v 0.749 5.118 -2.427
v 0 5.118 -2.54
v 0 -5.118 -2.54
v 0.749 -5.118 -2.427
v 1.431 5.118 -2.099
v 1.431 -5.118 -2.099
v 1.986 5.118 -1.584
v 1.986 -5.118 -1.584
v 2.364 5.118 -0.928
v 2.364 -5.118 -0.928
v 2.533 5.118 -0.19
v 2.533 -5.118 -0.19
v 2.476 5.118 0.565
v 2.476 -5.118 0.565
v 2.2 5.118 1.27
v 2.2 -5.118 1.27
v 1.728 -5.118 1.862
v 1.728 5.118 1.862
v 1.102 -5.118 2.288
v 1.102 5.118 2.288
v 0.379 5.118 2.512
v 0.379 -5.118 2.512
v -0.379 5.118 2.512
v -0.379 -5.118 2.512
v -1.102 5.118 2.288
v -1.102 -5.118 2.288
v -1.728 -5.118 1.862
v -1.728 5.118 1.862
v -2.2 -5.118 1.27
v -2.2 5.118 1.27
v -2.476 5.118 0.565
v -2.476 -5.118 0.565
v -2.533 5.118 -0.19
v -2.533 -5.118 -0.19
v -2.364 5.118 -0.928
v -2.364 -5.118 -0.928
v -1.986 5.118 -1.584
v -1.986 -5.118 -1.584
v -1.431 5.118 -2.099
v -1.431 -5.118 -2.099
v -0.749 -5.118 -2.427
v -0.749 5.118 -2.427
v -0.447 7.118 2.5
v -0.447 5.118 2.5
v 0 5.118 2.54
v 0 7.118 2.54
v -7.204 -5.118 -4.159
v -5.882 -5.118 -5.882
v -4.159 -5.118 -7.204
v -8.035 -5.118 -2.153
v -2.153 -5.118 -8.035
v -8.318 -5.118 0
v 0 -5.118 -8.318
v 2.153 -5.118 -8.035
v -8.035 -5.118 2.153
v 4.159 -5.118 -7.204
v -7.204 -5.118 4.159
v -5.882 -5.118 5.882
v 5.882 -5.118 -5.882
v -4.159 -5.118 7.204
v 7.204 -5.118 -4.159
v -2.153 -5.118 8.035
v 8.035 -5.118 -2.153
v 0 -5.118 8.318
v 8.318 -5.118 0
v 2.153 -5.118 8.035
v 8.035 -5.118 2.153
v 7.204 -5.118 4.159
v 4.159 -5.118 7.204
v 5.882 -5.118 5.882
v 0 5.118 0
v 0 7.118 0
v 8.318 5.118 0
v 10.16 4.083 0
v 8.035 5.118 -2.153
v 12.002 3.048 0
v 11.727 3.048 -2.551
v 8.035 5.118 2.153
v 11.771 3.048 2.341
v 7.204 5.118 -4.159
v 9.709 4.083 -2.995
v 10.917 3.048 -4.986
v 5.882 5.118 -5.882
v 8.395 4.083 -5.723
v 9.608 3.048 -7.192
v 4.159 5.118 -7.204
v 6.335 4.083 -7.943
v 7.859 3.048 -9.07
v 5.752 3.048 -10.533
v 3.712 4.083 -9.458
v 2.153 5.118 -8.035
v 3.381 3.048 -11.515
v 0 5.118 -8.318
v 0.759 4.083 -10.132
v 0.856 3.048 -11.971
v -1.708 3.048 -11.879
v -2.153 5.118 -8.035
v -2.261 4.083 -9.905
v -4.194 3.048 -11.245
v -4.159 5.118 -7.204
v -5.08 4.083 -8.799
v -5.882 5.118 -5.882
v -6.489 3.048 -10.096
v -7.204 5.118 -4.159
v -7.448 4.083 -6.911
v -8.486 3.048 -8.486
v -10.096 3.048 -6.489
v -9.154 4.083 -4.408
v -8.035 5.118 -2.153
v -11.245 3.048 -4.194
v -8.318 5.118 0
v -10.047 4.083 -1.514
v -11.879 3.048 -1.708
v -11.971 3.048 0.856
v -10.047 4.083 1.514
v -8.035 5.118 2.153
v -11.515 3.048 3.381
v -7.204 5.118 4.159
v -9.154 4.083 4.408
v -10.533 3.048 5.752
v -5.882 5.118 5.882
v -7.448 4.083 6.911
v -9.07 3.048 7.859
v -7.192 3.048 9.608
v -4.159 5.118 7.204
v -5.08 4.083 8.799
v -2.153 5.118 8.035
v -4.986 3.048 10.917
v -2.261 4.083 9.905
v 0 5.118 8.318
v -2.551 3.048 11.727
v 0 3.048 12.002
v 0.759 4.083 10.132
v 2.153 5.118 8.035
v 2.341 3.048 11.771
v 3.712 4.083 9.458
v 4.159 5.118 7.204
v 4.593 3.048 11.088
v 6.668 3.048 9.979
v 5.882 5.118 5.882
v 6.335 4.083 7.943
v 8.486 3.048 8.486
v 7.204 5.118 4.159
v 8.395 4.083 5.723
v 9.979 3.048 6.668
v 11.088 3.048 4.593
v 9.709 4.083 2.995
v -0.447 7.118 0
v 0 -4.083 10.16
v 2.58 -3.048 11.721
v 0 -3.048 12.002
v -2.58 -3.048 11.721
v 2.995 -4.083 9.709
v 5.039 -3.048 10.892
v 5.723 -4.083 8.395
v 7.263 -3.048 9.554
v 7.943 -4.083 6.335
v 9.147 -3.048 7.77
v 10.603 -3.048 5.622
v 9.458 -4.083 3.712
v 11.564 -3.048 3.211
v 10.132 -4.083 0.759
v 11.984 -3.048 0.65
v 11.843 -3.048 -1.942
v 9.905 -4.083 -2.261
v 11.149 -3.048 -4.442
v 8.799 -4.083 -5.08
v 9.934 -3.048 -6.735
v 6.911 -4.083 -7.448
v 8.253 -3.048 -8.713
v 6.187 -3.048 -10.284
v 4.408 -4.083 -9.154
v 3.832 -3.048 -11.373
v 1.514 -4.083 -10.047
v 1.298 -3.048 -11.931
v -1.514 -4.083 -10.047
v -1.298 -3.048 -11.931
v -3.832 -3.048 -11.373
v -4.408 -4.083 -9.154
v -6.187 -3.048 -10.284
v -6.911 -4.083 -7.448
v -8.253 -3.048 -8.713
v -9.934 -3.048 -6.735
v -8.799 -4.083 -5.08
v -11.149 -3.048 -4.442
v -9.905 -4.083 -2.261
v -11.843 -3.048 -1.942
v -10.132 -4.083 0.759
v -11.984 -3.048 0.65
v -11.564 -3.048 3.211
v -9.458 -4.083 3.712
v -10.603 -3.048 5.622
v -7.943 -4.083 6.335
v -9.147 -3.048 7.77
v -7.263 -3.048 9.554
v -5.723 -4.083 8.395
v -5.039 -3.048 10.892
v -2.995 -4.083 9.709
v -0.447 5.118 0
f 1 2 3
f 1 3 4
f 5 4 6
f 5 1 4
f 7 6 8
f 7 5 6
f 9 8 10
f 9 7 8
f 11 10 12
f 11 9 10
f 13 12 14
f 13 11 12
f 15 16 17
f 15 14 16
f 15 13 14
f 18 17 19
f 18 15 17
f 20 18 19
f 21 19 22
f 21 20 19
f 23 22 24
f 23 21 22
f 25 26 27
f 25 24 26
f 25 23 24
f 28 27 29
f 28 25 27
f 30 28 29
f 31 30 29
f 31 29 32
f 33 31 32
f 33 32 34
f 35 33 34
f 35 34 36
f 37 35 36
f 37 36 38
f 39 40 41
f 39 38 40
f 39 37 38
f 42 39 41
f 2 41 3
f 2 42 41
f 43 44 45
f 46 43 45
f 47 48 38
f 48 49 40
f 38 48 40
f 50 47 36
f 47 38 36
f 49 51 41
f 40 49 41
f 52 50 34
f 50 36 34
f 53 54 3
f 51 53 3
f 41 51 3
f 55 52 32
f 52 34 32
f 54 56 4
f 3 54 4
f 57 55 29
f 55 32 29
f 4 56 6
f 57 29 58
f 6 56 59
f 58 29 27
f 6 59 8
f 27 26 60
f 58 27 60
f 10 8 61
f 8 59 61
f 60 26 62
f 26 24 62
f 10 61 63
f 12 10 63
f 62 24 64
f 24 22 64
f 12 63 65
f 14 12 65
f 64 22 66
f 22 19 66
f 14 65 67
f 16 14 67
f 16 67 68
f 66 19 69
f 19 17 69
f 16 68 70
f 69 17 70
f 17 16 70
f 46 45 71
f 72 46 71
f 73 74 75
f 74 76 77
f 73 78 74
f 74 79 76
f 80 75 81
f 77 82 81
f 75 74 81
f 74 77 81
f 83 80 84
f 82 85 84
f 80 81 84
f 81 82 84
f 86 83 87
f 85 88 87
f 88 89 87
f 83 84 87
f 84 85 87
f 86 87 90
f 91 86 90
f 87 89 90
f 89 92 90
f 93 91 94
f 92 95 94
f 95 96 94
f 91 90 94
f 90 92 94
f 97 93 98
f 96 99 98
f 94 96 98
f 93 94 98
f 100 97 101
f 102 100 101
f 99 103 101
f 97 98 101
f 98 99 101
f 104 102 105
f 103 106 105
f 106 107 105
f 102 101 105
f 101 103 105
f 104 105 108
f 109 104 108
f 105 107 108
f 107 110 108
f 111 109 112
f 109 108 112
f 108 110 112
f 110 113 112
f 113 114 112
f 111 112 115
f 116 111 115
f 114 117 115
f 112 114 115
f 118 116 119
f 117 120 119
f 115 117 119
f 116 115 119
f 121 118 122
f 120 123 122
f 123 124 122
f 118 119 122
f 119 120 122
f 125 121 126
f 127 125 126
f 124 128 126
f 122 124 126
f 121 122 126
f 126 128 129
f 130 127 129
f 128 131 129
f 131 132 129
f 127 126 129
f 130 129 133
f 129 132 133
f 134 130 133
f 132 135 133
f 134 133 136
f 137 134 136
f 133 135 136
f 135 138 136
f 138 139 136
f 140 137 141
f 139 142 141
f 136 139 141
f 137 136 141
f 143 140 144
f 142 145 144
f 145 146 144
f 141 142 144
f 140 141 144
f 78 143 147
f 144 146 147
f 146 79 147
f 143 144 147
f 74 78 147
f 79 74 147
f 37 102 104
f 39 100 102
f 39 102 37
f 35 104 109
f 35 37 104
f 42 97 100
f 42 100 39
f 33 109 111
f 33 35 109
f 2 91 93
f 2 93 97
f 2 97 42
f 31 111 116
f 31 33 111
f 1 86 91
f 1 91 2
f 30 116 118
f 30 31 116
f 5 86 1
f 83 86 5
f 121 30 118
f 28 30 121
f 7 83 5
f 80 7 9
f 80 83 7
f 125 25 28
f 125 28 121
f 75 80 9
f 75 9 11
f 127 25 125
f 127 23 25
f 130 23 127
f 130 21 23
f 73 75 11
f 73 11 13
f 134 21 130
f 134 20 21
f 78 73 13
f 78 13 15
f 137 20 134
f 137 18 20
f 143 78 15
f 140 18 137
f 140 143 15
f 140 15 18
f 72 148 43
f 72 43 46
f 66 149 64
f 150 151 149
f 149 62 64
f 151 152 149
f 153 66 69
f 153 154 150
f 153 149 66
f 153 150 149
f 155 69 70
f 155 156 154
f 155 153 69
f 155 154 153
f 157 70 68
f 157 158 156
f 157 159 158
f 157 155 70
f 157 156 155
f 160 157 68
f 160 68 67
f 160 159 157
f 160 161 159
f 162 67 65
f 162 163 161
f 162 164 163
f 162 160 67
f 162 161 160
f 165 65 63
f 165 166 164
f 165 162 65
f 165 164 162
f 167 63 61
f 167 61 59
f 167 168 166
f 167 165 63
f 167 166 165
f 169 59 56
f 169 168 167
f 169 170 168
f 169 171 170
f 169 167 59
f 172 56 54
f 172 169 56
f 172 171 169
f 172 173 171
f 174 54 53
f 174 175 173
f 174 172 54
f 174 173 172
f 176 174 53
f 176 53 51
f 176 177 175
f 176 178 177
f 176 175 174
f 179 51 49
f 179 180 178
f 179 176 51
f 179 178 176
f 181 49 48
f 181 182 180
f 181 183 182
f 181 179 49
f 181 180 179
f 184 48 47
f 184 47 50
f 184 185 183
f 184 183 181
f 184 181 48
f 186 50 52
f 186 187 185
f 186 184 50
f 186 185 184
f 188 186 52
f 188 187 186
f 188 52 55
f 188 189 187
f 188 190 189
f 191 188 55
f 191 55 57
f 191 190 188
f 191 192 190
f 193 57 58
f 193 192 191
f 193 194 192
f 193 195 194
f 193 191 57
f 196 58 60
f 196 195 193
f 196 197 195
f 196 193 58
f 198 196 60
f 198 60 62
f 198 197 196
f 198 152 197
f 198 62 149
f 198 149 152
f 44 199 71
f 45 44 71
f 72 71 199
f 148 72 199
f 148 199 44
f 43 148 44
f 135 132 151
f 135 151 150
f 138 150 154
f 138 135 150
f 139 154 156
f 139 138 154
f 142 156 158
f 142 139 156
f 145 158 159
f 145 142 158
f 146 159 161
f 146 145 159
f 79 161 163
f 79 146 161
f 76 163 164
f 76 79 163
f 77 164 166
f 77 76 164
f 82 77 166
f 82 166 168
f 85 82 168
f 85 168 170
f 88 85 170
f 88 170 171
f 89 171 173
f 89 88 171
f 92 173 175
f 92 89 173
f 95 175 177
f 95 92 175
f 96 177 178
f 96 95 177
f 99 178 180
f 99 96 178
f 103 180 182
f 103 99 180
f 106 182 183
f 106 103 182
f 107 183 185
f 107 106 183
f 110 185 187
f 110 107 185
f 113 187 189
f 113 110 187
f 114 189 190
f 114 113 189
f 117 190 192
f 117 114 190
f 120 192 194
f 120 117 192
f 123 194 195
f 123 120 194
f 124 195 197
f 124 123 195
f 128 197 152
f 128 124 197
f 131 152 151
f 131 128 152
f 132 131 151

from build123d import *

# Parameters (mm, degrees)
SKETCH1_R               = 12.0015
BOSS_EXTRUDE1_DEPTH     = 5.1181
CUT_EXTRUDE1_DEPTH      = 20.820489271
CUT_EXTRUDE1_DEPTH_BACK = 20.820489271
SKETCH2_R               = 2.54
CHAMFER4_SIZE           = 3.683
CHAMFER4_SIZE2          = 2.0701
BOSS_EXTRUDE2_DEPTH     = 2


with BuildPart() as part:
    # Sketch1 → Boss-Extrude1 (new, symmetric)
    with BuildSketch(Plane(origin=(0, 0, 0), x_dir=(1, 0, 0), z_dir=(0, 1, 0))):
        with Locations(Location((0, 0, 0), (0, 0, 270))):
            Circle(SKETCH1_R)
    extrude(amount=BOSS_EXTRUDE1_DEPTH, both=True)

    # Sketch2 → Cut-Extrude1 (cut, two sides: drawn at the far end of the back side and taken through both)
    with BuildSketch(Plane.XZ.offset(5.1181).offset(-CUT_EXTRUDE1_DEPTH_BACK)):
        with Locations(Location((0, 0, 0), (0, 0, 270))):
            Circle(SKETCH2_R)
    extrude(amount=CUT_EXTRUDE1_DEPTH + CUT_EXTRUDE1_DEPTH_BACK, mode=Mode.SUBTRACT)

    # Chamfer2: read off the stored shape, not the designer's step
    # Chamfer2 outline → Chamfer2 (revolve, cut)
    with BuildSketch(Plane.XY):
        Polygon((12.0015, 5.1181), (8.3185, 5.1181), (12.0015, 3.048), align=None)
    revolve(axis=Axis((0, 0, 0), (0, 1, 0)), mode=Mode.SUBTRACT)

    # Chamfer4
    chamfer4_edges = [part.edges().sort_by_distance(p)[0] for p in [
        (0, -5.1181, -12.0015),
    ]]
    chamfer4_side = [part.faces().sort_by_distance(p)[0] for p in [
        (0, -5.1181, -11.662046319),
    ]]
    chamfer(chamfer4_edges, length=CHAMFER4_SIZE, length2=CHAMFER4_SIZE2, reference=chamfer4_side[0])


with BuildPart() as body_2:
    # Sketch4 → Boss-Extrude2 (new body)
    with BuildSketch(Plane(origin=(0, 5.1181, 0), x_dir=(1, 0, 0), z_dir=(0, 1, 0))):
        Polygon((0, 0), (-0.446980105, 0), (-0.446980105, -2.500361731), (0, -2.54), align=None)
    extrude(amount=BOSS_EXTRUDE2_DEPTH)


solid = Compound([part.part, body_2.part])
